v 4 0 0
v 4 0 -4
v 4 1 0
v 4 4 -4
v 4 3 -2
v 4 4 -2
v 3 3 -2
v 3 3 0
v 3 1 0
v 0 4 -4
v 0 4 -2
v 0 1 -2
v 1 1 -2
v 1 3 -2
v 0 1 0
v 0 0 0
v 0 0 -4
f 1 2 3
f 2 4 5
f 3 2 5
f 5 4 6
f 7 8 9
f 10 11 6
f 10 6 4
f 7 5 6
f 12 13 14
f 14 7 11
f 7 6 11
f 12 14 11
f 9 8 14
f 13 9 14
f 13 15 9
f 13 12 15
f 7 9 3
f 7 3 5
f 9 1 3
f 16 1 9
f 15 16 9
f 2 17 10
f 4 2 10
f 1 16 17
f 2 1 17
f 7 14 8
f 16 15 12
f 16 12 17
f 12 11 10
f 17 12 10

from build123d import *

# Parameters (mm, degrees)
SKETCH1_W           = 4
SKETCH1_H           = 4
BOSS_EXTRUDE1_DEPTH = 4
SKETCH2_W           = 1
SKETCH2_H           = 2
CUT_EXTRUDE1_DEPTH  = 3
SKETCH4_W           = 3
SKETCH4_H           = 2
CUT_EXTRUDE2_DEPTH  = 1
BOSS_EXTRUDE2_DEPTH = 1


with BuildPart() as part:
    # Sketch1 → Boss-Extrude1 (new body)
    with BuildSketch(Plane(origin=(0, 0, 0), x_dir=(0, 0, -1), z_dir=(1, 0, 0))):
        with Locations((2, 2)):
            Rectangle(SKETCH1_W, SKETCH1_H)
    extrude(amount=BOSS_EXTRUDE1_DEPTH)

    # Sketch2 → Cut-Extrude1 (cut)
    with BuildSketch(Plane(origin=(0, 4, 0), x_dir=(1, 0, 0), z_dir=(0, 1, 0))):
        Polygon((0, 0), (3, 0), (1, 2), (0, 2), align=None)
        with Locations((3.5, 1)):
            Rectangle(SKETCH2_W, SKETCH2_H)
    extrude(amount=-CUT_EXTRUDE1_DEPTH, mode=Mode.SUBTRACT)

    # Sketch4 → Cut-Extrude2 (cut)
    with BuildSketch(Plane(origin=(0, 4, 0), x_dir=(1, 0, 0), z_dir=(0, 1, 0))):
        with Locations((2.5, 1)):
            Rectangle(SKETCH4_W, SKETCH4_H)
    extrude(amount=-CUT_EXTRUDE2_DEPTH, mode=Mode.SUBTRACT)

    # Sketch5 → Boss-Extrude2 (add)
    with BuildSketch(Plane(origin=(3, 0, 0), x_dir=(0, 0, -1), z_dir=(1, 0, 0))):
        Polygon((0, 1), (2, 3), (2, 1), align=None)
    extrude(amount=BOSS_EXTRUDE2_DEPTH)


solid = part.part
